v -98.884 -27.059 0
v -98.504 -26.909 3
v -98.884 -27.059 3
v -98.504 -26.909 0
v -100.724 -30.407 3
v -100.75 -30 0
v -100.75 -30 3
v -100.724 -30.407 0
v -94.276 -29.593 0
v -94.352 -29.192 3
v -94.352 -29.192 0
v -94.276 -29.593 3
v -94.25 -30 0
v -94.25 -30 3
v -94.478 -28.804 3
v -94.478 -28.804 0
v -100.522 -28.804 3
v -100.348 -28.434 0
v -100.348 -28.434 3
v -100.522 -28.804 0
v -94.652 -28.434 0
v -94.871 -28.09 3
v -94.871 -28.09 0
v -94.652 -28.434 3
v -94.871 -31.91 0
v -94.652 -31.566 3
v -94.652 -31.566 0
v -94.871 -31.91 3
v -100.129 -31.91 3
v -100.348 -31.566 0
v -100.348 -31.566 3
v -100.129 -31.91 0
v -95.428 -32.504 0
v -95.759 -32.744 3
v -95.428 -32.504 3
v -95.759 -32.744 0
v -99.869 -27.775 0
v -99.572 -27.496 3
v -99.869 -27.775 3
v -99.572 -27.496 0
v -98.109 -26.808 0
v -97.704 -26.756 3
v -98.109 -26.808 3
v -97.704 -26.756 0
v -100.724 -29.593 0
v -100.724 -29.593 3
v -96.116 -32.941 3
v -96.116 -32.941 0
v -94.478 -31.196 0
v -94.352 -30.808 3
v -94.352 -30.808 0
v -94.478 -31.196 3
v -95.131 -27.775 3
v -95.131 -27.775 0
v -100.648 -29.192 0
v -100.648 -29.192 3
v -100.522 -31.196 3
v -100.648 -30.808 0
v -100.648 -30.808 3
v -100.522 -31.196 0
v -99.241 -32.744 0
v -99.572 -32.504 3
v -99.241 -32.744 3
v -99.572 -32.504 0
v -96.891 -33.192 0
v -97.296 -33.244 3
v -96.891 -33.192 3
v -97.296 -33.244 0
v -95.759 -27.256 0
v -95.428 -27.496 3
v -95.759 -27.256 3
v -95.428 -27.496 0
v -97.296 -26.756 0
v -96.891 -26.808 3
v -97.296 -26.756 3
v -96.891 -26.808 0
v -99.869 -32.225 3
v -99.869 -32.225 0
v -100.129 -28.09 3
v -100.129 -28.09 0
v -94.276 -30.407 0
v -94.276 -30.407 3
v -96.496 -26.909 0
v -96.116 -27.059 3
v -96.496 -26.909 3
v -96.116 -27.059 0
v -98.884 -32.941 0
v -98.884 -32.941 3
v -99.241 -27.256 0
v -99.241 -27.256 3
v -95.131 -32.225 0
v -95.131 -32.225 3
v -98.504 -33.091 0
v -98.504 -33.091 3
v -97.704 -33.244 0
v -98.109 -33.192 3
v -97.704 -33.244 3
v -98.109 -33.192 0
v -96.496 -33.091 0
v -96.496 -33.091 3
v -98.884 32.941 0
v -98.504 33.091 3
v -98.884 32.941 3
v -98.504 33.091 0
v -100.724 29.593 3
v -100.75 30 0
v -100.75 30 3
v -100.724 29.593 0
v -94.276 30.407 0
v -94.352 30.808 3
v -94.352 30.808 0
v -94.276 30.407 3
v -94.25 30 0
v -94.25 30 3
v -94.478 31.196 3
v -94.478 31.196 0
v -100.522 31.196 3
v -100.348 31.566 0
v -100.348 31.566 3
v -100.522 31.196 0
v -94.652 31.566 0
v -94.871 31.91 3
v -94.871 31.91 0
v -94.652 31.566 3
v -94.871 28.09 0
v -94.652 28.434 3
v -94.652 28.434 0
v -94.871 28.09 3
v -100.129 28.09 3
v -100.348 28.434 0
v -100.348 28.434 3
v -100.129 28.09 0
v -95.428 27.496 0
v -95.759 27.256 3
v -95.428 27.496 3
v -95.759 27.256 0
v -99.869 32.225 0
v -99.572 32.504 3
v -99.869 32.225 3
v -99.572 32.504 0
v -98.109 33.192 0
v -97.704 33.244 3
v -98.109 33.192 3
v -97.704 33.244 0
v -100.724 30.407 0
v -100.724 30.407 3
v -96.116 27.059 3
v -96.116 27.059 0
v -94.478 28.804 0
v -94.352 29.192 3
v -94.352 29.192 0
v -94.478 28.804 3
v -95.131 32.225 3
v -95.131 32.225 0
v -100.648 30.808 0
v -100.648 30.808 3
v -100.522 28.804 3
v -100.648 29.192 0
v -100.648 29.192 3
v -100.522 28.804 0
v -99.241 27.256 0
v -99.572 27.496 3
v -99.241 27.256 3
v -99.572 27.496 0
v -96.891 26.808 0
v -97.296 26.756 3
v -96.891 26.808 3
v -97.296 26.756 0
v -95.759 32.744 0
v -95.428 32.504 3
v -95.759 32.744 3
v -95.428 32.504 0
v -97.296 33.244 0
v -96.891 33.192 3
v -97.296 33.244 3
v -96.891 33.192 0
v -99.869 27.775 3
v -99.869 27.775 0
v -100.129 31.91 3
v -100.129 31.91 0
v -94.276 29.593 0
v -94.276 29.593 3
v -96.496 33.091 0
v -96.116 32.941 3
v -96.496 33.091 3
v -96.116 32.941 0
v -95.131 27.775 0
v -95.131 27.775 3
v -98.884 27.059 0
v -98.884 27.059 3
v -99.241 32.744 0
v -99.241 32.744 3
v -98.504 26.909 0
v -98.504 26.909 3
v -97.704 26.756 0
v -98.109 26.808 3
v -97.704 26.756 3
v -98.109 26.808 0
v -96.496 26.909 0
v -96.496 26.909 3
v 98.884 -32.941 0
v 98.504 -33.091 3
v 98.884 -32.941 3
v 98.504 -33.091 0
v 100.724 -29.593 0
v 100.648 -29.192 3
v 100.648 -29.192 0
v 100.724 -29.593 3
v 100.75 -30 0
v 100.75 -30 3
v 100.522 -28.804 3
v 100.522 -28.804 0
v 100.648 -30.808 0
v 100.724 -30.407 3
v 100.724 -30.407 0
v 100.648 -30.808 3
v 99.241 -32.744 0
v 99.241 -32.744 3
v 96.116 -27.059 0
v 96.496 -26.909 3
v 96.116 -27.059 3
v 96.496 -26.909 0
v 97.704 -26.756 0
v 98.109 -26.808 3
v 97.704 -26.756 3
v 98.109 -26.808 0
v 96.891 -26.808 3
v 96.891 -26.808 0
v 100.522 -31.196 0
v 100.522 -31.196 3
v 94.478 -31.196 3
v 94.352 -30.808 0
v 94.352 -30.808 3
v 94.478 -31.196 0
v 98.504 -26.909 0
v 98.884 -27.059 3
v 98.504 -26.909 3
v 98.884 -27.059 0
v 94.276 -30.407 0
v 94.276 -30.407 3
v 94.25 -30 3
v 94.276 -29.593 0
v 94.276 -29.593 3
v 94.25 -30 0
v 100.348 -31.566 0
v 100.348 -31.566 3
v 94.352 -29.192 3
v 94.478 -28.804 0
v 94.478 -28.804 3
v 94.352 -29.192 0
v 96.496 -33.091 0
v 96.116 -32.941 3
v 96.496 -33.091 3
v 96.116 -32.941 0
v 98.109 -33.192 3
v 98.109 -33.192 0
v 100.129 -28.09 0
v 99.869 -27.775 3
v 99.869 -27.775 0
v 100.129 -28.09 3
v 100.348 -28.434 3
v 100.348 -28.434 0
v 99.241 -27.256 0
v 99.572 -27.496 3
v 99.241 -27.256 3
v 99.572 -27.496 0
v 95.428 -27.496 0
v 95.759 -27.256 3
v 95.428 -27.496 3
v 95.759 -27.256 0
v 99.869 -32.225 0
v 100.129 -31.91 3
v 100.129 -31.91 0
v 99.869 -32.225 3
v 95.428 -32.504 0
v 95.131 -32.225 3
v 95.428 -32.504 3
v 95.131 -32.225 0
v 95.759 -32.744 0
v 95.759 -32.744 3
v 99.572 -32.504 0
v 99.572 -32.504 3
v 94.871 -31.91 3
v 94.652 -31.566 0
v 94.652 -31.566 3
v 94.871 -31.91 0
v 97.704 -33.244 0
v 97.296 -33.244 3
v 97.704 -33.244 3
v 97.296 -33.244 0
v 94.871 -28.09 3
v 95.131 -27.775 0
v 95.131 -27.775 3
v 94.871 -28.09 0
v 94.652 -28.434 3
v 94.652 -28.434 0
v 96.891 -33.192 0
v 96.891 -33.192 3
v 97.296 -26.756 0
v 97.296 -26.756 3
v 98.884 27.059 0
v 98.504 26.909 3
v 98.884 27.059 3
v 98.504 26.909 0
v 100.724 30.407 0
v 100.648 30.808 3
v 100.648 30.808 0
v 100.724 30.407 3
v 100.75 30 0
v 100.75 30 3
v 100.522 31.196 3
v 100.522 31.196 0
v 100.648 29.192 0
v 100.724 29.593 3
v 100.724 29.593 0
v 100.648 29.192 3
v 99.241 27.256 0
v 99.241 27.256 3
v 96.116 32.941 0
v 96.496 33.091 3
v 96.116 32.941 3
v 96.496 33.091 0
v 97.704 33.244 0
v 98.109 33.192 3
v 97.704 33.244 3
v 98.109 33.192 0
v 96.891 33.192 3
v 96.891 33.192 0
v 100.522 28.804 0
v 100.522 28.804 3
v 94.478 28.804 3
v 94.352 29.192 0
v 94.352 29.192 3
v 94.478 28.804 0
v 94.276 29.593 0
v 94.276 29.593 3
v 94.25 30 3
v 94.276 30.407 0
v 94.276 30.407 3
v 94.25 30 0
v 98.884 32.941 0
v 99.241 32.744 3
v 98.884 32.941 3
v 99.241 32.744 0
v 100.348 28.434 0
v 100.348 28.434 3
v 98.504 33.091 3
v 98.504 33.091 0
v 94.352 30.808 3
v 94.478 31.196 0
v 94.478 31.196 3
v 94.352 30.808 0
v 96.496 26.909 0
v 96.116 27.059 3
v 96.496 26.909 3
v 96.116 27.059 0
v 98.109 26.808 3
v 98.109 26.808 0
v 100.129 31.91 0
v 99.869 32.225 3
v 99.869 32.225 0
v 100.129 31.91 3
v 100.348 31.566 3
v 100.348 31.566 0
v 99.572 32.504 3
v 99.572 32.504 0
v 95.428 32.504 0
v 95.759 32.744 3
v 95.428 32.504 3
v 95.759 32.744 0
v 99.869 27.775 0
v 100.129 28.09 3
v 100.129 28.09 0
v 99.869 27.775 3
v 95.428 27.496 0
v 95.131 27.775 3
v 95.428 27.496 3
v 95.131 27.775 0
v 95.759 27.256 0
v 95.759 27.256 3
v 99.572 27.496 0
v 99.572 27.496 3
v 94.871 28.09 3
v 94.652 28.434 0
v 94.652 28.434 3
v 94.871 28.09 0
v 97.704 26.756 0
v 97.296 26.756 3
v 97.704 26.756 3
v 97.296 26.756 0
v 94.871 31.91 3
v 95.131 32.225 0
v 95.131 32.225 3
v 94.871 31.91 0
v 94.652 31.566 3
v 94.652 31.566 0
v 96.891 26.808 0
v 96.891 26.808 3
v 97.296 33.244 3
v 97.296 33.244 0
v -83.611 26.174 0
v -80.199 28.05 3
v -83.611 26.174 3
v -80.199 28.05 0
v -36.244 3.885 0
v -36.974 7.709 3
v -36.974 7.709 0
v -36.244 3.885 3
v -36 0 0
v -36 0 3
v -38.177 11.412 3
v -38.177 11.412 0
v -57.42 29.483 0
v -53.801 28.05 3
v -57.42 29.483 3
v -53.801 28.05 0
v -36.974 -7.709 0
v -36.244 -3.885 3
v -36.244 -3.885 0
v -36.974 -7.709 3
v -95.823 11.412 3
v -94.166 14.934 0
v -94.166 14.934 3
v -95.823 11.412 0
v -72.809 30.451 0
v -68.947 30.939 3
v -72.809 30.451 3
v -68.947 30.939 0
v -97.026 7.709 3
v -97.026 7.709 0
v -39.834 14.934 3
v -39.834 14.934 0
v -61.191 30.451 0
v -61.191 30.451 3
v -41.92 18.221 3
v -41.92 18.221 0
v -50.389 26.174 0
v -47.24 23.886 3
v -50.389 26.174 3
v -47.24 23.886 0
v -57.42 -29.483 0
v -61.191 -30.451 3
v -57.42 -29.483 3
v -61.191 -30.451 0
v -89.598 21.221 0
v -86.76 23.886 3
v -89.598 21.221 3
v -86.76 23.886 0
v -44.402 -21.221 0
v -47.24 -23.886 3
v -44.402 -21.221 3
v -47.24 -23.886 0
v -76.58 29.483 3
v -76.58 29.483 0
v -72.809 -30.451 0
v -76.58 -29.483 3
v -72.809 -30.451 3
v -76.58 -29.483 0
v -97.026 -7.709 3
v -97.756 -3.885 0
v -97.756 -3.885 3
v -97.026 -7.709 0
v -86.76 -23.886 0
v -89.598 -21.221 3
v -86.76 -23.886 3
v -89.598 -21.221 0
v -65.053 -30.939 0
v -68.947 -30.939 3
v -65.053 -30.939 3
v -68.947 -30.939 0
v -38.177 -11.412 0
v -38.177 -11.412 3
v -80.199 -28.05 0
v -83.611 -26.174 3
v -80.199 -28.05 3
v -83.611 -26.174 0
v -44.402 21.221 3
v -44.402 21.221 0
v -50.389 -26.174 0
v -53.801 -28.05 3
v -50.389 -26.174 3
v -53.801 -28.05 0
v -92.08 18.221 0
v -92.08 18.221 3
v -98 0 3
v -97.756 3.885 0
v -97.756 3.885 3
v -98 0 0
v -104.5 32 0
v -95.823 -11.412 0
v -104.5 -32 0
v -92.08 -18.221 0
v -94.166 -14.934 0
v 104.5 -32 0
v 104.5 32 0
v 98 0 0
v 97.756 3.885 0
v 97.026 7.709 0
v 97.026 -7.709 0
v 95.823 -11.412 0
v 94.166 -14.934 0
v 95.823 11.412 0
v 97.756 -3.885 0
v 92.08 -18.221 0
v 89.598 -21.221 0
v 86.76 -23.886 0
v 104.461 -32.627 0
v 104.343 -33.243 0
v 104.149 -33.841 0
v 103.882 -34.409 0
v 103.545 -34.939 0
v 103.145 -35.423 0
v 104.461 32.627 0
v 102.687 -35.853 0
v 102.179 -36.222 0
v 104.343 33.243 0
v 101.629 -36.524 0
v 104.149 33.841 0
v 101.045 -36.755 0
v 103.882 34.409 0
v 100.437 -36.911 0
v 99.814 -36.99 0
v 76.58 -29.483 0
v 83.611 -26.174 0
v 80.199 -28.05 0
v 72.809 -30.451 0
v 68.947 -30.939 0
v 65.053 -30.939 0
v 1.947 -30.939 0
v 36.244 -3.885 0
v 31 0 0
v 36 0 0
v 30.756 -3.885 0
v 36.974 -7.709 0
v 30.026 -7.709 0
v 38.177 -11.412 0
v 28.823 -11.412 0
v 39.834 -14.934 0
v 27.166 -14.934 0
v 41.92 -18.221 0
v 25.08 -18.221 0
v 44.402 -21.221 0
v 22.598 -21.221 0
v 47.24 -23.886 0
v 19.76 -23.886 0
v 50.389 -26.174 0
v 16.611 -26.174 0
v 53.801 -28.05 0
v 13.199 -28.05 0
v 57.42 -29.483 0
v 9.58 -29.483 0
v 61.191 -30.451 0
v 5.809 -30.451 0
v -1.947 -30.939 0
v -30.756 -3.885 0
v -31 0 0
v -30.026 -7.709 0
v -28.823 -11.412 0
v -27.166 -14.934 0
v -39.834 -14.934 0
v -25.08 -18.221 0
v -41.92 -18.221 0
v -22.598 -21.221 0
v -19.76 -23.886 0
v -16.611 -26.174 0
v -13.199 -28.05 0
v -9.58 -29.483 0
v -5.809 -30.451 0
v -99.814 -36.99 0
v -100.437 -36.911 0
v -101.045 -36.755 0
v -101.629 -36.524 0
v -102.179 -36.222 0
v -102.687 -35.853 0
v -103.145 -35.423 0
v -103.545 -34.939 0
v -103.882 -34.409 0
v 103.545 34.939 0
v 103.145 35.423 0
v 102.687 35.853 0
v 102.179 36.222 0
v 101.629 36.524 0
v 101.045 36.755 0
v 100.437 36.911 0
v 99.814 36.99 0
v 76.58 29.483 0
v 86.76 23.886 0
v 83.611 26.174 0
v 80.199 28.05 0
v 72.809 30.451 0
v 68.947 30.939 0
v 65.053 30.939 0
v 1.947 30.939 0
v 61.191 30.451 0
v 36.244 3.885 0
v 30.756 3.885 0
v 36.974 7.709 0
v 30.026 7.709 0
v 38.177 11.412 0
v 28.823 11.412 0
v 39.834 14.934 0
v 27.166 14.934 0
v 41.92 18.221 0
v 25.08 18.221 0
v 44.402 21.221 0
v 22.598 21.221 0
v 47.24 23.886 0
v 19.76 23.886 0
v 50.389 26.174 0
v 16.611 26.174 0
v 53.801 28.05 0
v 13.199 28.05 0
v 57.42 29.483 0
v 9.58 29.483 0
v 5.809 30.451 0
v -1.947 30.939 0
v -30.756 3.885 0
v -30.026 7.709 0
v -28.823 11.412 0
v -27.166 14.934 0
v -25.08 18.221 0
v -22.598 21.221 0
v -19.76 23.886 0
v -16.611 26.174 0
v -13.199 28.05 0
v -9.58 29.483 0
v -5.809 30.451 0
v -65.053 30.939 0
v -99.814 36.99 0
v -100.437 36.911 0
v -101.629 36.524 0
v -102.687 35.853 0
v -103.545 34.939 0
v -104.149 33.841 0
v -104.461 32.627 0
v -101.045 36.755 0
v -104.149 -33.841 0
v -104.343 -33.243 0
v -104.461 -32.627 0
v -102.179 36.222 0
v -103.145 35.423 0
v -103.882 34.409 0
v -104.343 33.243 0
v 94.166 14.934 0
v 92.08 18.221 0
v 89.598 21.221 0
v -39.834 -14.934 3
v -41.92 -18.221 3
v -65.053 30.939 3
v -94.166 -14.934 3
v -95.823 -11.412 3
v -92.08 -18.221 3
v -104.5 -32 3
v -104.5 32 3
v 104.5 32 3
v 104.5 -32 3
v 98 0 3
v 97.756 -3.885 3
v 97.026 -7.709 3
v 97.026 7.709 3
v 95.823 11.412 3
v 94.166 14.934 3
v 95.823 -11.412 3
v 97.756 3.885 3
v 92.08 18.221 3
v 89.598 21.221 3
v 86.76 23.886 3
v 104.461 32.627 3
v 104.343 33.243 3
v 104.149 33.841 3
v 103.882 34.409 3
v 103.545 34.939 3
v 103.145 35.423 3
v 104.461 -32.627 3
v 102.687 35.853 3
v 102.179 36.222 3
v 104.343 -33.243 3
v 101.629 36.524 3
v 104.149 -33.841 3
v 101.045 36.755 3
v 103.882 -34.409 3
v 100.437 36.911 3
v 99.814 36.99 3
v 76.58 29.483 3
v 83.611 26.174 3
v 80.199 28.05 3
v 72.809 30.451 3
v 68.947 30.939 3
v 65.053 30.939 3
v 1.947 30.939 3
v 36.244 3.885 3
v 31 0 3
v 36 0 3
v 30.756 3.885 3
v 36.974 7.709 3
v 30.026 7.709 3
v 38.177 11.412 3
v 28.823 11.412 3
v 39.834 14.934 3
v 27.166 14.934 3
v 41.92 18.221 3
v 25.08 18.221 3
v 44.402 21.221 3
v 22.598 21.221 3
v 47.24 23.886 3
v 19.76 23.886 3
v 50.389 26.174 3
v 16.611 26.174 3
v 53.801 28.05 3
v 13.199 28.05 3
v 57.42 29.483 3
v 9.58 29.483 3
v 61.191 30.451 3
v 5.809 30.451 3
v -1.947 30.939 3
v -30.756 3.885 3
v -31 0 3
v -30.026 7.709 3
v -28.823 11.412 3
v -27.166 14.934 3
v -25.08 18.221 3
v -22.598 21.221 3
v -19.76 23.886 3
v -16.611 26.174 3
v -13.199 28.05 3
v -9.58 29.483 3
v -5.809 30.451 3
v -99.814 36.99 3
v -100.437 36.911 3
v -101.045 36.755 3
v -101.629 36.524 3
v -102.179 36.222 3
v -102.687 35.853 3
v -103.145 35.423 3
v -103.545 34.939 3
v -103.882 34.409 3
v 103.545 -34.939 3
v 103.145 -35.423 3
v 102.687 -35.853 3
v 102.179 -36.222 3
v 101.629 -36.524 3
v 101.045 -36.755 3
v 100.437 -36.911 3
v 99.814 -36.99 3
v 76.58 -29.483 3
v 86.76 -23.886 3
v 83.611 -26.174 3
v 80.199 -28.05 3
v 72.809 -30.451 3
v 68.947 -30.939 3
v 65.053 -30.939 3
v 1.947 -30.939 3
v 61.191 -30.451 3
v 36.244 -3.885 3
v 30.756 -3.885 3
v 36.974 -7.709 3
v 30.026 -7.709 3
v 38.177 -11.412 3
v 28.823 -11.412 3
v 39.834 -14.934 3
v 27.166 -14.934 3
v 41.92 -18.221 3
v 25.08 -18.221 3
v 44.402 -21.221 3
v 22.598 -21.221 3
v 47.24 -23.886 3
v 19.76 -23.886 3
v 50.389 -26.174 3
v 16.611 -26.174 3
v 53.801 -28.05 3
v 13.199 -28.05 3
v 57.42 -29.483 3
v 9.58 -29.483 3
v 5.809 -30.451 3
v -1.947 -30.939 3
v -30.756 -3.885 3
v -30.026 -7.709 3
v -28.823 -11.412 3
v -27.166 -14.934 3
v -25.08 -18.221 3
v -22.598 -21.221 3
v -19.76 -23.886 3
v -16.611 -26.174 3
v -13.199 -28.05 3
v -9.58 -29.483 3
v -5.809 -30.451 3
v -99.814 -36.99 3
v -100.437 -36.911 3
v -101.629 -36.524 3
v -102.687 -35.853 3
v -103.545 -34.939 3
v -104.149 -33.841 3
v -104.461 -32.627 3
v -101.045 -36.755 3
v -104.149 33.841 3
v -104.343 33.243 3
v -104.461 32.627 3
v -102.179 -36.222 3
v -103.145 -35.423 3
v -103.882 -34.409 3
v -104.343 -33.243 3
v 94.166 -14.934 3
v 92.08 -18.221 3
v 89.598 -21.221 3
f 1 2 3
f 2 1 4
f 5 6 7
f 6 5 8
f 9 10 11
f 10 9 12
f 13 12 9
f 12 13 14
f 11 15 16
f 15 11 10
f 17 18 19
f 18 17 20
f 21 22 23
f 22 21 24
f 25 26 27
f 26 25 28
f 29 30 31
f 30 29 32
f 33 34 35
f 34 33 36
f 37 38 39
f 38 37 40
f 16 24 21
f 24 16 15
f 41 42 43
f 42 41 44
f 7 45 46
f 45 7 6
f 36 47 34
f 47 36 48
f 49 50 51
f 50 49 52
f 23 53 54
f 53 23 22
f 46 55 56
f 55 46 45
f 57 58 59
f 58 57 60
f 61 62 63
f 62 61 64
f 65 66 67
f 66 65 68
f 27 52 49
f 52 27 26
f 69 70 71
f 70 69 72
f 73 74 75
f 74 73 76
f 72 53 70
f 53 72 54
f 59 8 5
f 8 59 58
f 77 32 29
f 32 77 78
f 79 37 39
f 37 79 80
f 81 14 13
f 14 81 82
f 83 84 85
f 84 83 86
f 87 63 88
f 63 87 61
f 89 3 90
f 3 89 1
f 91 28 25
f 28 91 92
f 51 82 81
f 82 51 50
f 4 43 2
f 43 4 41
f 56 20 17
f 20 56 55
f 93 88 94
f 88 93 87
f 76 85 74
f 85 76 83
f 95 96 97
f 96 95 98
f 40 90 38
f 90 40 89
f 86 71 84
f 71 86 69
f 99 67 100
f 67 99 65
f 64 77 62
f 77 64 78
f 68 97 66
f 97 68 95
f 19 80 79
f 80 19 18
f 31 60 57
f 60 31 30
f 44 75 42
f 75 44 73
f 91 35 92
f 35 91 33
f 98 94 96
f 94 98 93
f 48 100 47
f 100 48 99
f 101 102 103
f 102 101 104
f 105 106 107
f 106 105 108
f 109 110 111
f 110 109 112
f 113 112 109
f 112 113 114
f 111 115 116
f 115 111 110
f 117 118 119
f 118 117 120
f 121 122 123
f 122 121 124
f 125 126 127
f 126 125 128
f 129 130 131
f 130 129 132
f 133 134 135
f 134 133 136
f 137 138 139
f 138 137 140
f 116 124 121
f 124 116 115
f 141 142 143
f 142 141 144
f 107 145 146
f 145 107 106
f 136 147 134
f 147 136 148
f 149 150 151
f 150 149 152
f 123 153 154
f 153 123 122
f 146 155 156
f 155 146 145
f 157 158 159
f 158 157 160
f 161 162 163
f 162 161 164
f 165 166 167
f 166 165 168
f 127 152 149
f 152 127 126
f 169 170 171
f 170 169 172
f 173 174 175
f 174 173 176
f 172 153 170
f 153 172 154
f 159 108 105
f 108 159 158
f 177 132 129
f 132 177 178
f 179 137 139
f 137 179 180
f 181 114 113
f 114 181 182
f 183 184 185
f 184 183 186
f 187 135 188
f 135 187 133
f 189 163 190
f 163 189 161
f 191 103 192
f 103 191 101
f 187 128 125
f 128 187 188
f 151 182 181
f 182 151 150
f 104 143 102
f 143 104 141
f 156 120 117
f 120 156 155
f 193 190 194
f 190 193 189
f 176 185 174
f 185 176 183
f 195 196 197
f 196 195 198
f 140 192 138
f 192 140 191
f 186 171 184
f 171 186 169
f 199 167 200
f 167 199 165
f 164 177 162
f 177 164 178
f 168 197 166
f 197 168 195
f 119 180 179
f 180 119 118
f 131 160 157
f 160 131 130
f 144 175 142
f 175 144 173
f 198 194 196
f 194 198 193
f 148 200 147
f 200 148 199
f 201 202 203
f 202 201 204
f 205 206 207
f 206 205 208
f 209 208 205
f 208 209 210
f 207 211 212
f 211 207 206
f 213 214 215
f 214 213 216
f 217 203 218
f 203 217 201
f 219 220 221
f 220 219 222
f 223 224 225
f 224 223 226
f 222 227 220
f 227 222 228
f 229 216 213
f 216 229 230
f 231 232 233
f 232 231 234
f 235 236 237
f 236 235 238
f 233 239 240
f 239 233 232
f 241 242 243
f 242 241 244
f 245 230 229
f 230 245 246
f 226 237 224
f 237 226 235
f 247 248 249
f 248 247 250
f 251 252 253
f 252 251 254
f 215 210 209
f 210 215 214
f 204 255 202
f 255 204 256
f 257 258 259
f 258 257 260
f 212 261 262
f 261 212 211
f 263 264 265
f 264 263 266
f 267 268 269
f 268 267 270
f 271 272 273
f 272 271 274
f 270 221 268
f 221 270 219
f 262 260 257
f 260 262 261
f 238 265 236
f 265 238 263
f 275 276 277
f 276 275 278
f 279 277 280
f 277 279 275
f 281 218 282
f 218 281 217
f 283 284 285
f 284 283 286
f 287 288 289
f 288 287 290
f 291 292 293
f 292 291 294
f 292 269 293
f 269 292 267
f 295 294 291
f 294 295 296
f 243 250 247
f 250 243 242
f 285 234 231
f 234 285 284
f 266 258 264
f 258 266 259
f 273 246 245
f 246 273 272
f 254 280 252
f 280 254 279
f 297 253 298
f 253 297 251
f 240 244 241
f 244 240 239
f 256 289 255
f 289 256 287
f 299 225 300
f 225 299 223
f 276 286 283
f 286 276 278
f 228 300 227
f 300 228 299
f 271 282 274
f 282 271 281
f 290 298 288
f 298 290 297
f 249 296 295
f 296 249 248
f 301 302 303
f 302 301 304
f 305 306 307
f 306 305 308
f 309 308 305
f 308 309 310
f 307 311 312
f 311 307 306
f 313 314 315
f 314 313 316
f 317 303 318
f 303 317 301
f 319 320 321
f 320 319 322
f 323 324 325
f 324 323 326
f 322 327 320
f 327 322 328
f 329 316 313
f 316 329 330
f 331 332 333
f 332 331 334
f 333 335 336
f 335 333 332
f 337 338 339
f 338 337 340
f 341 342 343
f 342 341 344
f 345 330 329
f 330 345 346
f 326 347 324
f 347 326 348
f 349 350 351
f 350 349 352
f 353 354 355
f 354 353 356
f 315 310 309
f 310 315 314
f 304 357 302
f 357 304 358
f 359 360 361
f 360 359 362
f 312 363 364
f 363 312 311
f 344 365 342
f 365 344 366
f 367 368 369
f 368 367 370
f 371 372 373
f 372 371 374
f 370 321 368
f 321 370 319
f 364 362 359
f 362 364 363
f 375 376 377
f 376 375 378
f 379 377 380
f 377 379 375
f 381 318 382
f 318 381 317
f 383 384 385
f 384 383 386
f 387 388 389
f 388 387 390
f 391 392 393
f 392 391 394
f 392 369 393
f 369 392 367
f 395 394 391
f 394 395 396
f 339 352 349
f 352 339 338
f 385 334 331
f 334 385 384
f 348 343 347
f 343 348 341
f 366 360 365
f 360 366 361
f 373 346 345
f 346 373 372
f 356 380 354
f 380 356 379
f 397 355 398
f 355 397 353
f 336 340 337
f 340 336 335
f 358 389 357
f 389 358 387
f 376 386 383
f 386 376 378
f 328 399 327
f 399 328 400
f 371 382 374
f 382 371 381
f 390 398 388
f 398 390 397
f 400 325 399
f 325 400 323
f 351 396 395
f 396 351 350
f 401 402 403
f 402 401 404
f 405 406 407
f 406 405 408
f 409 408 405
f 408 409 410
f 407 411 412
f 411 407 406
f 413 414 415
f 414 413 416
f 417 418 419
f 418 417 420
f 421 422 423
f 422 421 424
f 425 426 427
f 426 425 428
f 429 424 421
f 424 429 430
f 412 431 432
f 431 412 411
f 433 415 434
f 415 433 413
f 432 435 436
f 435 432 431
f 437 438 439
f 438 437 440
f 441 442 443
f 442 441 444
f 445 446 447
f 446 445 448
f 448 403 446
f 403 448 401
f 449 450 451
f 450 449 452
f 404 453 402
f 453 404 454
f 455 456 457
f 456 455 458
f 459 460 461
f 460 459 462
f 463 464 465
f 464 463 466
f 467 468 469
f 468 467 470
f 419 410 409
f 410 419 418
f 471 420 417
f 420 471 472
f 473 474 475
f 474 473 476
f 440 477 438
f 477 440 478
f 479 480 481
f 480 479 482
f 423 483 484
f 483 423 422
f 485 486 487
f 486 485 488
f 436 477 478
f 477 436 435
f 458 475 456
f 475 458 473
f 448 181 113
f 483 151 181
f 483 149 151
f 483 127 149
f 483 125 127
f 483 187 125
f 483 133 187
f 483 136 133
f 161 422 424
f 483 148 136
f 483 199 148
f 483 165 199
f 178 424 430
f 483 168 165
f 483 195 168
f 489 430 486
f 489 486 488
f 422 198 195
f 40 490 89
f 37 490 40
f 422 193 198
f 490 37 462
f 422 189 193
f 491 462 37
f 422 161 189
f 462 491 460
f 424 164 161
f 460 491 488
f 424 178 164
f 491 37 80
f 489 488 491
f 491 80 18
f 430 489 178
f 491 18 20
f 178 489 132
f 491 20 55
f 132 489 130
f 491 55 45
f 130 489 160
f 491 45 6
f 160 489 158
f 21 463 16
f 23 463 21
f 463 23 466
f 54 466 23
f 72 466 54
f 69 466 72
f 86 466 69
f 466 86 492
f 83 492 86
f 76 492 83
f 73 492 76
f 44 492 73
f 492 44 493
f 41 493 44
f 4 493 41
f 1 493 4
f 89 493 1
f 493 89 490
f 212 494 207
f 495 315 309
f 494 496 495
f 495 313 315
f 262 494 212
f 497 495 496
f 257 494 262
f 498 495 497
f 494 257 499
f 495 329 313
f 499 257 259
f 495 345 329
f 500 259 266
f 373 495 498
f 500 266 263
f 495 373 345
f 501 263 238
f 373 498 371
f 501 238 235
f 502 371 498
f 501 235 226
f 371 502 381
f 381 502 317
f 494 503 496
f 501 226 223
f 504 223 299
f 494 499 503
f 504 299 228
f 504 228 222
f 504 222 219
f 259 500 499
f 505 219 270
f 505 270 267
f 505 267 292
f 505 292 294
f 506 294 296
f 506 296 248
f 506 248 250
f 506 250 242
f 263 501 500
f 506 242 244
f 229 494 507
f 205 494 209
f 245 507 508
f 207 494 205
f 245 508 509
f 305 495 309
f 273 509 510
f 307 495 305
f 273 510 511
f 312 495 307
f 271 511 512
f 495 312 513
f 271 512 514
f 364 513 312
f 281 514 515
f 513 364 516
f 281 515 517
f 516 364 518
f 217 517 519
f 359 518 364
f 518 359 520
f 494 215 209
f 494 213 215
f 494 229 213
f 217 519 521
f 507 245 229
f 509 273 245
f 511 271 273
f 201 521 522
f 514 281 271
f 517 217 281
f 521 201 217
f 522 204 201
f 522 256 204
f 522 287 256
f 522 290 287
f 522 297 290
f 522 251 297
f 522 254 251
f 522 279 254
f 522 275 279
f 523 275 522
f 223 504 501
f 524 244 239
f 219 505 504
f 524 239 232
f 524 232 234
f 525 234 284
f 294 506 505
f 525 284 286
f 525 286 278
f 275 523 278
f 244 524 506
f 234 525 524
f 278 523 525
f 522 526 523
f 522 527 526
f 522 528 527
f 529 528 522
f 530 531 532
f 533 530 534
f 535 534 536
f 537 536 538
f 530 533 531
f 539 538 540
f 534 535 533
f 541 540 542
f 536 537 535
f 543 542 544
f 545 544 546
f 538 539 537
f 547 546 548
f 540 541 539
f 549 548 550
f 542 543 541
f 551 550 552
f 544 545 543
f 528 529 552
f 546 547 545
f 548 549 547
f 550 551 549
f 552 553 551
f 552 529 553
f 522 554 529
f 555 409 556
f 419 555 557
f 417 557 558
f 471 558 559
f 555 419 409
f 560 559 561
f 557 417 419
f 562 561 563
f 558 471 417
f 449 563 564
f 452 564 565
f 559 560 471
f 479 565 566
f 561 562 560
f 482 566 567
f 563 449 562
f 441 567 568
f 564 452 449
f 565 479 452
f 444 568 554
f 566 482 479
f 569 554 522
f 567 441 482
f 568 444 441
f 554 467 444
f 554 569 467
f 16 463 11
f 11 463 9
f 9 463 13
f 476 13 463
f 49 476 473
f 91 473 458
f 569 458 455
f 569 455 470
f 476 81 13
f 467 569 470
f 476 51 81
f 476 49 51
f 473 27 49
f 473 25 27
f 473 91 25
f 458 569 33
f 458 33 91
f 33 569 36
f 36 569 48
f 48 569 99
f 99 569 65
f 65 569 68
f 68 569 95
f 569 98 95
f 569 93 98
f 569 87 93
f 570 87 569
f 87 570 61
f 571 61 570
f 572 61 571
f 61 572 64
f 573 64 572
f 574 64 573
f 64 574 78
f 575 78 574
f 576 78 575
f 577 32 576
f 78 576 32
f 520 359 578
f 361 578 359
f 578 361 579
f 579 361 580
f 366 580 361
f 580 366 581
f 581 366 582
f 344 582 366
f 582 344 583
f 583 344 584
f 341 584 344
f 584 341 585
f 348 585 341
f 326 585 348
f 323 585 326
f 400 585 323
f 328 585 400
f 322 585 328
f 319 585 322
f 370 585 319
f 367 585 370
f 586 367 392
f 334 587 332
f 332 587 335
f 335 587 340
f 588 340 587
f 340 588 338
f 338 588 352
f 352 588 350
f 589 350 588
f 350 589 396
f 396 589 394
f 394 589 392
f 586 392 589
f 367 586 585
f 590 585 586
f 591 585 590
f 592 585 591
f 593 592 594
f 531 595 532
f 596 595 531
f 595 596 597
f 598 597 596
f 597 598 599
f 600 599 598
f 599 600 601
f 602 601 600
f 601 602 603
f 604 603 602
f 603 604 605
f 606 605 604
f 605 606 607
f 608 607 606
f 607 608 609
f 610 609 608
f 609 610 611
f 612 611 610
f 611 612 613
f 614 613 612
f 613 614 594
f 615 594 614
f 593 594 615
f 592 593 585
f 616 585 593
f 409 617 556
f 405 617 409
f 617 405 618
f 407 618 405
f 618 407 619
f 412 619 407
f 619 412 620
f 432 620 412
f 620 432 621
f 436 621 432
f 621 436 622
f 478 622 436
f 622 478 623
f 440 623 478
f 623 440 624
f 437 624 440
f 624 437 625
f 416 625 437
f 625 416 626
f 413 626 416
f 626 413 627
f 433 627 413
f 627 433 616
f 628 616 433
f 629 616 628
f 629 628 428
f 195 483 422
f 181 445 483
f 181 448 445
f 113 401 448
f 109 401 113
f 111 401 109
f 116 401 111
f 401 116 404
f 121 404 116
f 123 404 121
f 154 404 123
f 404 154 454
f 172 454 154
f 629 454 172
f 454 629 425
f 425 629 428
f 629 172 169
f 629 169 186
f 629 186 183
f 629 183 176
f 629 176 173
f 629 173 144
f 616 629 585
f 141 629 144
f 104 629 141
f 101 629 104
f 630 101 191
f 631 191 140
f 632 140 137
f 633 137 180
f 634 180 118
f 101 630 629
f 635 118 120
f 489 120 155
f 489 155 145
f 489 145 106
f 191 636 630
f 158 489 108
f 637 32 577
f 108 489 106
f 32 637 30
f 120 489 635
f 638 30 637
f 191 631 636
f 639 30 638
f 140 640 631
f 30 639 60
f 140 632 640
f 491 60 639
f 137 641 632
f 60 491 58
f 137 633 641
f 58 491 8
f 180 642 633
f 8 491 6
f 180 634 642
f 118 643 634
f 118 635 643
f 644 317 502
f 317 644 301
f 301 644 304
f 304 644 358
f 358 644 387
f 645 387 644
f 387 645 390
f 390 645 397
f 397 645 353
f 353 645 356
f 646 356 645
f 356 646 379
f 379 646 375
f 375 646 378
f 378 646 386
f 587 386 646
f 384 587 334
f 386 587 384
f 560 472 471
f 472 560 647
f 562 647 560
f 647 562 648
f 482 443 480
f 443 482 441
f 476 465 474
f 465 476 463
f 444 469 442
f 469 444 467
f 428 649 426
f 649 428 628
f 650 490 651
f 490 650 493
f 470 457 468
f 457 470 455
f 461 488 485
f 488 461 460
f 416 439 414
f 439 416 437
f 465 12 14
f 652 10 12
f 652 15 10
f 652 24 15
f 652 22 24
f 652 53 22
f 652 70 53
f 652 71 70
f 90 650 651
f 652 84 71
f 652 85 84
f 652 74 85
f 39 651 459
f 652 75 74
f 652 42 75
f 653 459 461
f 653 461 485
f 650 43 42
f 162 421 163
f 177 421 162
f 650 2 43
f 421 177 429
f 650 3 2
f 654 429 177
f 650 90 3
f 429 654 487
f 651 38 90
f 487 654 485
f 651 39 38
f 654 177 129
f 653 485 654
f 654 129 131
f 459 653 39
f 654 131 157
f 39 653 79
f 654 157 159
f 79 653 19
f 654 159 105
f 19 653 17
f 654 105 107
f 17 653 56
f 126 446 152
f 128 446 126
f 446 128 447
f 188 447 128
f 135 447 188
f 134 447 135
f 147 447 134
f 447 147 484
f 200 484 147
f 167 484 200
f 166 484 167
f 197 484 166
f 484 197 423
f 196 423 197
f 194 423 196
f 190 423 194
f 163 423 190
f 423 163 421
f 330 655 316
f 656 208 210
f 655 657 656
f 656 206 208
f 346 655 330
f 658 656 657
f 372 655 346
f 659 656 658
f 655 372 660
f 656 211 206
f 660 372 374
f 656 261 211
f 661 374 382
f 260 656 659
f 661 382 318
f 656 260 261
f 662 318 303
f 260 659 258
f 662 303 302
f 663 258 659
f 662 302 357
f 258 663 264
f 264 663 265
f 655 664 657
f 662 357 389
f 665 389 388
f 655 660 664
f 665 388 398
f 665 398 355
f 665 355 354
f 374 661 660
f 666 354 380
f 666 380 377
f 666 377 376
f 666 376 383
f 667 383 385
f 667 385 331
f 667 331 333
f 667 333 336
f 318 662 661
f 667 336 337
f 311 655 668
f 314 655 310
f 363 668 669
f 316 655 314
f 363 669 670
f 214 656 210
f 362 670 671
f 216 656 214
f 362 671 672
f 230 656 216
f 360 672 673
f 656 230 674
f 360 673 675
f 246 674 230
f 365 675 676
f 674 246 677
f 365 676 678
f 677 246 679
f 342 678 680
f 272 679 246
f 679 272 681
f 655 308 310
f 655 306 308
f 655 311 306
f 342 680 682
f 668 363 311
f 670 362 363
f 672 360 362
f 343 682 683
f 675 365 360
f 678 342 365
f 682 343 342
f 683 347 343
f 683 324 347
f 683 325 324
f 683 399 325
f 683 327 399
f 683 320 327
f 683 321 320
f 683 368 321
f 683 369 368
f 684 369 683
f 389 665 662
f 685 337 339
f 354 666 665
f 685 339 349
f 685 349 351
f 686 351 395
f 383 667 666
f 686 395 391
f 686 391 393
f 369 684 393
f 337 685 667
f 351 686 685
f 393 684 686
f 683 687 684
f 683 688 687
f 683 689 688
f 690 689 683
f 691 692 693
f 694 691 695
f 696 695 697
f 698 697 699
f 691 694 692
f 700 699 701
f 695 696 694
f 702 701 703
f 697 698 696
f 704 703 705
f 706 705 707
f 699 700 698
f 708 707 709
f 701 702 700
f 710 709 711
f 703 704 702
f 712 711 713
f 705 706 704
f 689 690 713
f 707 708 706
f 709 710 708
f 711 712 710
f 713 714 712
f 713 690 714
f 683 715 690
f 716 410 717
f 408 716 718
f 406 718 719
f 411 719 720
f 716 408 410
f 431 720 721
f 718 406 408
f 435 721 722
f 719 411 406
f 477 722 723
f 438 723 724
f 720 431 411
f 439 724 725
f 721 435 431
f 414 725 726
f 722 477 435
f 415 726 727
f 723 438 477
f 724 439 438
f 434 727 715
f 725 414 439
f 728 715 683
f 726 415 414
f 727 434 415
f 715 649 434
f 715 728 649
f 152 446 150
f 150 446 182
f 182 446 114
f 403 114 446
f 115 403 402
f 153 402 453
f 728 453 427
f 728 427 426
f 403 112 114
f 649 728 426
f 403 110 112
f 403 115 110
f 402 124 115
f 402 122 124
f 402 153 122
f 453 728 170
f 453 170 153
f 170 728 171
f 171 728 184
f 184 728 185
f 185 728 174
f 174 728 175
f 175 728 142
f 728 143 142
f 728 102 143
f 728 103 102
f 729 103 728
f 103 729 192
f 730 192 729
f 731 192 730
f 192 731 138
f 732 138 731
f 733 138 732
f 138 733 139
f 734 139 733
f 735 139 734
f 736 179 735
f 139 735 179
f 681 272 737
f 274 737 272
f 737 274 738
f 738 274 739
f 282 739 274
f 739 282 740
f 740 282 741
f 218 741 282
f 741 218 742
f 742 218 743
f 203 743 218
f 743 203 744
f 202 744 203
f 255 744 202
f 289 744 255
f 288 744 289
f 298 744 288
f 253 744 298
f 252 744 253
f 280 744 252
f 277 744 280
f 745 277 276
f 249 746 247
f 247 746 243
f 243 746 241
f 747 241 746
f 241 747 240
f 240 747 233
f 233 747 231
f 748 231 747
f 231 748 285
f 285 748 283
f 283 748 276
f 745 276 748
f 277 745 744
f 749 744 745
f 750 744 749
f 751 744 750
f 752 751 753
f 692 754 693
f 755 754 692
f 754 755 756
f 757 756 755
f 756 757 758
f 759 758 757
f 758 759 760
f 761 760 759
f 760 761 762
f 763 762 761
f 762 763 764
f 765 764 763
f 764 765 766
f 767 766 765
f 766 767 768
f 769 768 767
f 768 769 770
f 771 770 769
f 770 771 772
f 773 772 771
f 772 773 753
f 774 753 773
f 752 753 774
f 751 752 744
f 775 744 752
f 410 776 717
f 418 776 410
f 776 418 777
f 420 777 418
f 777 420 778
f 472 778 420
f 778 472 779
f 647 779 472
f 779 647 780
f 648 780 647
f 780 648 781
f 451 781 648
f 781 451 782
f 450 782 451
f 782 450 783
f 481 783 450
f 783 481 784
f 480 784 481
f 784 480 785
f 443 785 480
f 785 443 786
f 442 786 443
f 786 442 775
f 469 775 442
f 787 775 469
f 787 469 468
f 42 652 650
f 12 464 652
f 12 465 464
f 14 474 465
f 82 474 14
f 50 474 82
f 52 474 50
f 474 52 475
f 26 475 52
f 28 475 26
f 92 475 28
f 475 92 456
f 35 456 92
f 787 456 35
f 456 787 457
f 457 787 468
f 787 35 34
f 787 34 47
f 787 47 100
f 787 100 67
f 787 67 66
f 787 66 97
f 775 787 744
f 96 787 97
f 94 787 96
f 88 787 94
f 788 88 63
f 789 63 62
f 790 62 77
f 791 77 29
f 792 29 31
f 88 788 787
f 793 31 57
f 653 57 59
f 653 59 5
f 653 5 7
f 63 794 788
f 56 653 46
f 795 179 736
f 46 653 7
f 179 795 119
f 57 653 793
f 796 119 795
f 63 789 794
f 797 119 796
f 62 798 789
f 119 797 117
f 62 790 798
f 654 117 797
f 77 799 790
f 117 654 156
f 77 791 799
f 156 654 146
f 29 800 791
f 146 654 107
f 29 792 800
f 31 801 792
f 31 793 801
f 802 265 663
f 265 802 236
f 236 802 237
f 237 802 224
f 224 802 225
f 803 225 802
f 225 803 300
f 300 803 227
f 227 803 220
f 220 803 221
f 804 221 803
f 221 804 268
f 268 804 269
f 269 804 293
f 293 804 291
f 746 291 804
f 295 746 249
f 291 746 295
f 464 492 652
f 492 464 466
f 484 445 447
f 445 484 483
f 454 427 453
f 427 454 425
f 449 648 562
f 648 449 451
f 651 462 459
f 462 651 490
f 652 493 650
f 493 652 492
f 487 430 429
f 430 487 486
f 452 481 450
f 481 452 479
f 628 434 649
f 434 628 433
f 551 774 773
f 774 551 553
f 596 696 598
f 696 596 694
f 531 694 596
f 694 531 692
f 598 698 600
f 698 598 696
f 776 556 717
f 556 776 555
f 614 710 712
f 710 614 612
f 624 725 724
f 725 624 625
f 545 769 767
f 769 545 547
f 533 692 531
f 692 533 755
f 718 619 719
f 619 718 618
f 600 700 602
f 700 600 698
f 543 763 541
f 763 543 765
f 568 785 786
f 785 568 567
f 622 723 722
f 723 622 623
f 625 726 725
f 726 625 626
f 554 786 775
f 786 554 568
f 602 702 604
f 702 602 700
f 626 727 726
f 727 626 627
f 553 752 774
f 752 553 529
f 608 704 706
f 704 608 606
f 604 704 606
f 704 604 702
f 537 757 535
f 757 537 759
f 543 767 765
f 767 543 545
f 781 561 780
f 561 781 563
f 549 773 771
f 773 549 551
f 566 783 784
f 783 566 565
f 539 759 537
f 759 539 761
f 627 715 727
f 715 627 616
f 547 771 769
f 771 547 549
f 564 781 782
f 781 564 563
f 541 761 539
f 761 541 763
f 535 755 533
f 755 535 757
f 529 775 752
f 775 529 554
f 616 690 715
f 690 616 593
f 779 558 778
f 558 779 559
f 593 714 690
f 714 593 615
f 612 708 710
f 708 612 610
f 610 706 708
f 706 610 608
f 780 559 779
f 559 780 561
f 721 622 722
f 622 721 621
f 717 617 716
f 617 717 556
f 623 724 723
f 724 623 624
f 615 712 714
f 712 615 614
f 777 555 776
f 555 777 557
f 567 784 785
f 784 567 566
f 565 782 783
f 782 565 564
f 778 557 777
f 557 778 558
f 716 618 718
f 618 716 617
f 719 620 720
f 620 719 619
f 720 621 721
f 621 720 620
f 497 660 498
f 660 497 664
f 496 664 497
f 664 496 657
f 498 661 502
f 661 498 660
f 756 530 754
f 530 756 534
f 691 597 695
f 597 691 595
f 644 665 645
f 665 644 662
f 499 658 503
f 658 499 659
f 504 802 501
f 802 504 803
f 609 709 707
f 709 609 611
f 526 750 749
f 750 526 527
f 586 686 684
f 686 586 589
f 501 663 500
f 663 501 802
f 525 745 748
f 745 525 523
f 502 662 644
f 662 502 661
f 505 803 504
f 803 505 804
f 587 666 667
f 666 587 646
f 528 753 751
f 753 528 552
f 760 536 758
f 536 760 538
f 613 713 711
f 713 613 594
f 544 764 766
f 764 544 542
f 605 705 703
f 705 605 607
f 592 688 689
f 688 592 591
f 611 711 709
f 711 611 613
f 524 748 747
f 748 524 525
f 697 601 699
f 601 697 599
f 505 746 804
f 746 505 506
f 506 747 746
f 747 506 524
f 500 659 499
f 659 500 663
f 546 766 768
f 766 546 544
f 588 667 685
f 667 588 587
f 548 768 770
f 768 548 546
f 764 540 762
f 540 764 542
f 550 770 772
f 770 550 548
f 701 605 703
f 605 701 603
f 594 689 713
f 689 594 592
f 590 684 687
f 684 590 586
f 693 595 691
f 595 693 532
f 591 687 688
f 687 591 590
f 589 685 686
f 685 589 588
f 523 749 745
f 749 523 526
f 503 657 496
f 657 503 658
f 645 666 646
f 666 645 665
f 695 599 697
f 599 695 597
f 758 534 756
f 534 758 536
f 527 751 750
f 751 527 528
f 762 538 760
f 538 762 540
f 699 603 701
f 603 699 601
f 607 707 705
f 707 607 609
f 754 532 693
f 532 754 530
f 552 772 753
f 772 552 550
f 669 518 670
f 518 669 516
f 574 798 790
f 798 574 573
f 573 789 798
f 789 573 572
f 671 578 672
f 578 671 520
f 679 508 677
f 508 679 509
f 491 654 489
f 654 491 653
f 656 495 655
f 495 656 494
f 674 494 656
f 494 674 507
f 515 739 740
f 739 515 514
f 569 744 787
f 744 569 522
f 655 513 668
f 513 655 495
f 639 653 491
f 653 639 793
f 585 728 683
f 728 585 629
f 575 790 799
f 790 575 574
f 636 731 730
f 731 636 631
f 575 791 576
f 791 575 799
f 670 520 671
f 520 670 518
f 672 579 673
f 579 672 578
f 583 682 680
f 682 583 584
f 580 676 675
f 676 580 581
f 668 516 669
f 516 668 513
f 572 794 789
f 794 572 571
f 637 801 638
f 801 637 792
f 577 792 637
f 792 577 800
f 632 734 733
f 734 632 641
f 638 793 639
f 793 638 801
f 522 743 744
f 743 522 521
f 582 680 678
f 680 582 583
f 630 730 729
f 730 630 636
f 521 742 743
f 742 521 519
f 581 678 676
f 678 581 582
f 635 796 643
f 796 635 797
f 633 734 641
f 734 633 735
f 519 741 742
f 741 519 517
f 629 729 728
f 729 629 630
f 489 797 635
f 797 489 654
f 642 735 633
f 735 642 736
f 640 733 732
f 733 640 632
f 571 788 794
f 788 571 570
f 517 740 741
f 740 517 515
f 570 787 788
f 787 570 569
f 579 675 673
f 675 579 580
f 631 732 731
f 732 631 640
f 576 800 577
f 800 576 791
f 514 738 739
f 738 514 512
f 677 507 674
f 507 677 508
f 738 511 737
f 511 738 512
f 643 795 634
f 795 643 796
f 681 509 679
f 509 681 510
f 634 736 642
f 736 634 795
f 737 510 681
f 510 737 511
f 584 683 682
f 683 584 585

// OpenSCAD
$fn = 50;

difference() {
	union() {
		hull() {
			translate(v = [-99.5, 32.0, 0]) {
				cylinder(h = 3, r = 5);
			}
			translate(v = [99.5, 32.0, 0]) {
				cylinder(h = 3, r = 5);
			}
			translate(v = [-99.5, -32.0, 0]) {
				cylinder(h = 3, r = 5);
			}
			translate(v = [99.5, -32.0, 0]) {
				cylinder(h = 3, r = 5);
			}
		}
	}
	union() {
		translate(v = [-97.5, -30.0, -100.0]) {
			cylinder(h = 200, r = 3.25);
		}
		translate(v = [-97.5, 30.0, -100.0]) {
			cylinder(h = 200, r = 3.25);
		}
		translate(v = [97.5, -30.0, -100.0]) {
			cylinder(h = 200, r = 3.25);
		}
		translate(v = [97.5, 30.0, -100.0]) {
			cylinder(h = 200, r = 3.25);
		}
		translate(v = [-97.5, -30.0, -100.0]) {
			cylinder(h = 200, r = 1.8);
		}
		translate(v = [-97.5, 30.0, -100.0]) {
			cylinder(h = 200, r = 1.8);
		}
		translate(v = [97.5, -30.0, -100.0]) {
			cylinder(h = 200, r = 1.8);
		}
		translate(v = [97.5, 30.0, -100.0]) {
			cylinder(h = 200, r = 1.8);
		}
		translate(v = [-67.0, 0, 0.0]) {
			cylinder(h = 3, r = 31.0);
		}
		cylinder(h = 3, r = 31.0);
		translate(v = [67.0, 0, 0.0]) {
			cylinder(h = 3, r = 31.0);
		}
	}
}
